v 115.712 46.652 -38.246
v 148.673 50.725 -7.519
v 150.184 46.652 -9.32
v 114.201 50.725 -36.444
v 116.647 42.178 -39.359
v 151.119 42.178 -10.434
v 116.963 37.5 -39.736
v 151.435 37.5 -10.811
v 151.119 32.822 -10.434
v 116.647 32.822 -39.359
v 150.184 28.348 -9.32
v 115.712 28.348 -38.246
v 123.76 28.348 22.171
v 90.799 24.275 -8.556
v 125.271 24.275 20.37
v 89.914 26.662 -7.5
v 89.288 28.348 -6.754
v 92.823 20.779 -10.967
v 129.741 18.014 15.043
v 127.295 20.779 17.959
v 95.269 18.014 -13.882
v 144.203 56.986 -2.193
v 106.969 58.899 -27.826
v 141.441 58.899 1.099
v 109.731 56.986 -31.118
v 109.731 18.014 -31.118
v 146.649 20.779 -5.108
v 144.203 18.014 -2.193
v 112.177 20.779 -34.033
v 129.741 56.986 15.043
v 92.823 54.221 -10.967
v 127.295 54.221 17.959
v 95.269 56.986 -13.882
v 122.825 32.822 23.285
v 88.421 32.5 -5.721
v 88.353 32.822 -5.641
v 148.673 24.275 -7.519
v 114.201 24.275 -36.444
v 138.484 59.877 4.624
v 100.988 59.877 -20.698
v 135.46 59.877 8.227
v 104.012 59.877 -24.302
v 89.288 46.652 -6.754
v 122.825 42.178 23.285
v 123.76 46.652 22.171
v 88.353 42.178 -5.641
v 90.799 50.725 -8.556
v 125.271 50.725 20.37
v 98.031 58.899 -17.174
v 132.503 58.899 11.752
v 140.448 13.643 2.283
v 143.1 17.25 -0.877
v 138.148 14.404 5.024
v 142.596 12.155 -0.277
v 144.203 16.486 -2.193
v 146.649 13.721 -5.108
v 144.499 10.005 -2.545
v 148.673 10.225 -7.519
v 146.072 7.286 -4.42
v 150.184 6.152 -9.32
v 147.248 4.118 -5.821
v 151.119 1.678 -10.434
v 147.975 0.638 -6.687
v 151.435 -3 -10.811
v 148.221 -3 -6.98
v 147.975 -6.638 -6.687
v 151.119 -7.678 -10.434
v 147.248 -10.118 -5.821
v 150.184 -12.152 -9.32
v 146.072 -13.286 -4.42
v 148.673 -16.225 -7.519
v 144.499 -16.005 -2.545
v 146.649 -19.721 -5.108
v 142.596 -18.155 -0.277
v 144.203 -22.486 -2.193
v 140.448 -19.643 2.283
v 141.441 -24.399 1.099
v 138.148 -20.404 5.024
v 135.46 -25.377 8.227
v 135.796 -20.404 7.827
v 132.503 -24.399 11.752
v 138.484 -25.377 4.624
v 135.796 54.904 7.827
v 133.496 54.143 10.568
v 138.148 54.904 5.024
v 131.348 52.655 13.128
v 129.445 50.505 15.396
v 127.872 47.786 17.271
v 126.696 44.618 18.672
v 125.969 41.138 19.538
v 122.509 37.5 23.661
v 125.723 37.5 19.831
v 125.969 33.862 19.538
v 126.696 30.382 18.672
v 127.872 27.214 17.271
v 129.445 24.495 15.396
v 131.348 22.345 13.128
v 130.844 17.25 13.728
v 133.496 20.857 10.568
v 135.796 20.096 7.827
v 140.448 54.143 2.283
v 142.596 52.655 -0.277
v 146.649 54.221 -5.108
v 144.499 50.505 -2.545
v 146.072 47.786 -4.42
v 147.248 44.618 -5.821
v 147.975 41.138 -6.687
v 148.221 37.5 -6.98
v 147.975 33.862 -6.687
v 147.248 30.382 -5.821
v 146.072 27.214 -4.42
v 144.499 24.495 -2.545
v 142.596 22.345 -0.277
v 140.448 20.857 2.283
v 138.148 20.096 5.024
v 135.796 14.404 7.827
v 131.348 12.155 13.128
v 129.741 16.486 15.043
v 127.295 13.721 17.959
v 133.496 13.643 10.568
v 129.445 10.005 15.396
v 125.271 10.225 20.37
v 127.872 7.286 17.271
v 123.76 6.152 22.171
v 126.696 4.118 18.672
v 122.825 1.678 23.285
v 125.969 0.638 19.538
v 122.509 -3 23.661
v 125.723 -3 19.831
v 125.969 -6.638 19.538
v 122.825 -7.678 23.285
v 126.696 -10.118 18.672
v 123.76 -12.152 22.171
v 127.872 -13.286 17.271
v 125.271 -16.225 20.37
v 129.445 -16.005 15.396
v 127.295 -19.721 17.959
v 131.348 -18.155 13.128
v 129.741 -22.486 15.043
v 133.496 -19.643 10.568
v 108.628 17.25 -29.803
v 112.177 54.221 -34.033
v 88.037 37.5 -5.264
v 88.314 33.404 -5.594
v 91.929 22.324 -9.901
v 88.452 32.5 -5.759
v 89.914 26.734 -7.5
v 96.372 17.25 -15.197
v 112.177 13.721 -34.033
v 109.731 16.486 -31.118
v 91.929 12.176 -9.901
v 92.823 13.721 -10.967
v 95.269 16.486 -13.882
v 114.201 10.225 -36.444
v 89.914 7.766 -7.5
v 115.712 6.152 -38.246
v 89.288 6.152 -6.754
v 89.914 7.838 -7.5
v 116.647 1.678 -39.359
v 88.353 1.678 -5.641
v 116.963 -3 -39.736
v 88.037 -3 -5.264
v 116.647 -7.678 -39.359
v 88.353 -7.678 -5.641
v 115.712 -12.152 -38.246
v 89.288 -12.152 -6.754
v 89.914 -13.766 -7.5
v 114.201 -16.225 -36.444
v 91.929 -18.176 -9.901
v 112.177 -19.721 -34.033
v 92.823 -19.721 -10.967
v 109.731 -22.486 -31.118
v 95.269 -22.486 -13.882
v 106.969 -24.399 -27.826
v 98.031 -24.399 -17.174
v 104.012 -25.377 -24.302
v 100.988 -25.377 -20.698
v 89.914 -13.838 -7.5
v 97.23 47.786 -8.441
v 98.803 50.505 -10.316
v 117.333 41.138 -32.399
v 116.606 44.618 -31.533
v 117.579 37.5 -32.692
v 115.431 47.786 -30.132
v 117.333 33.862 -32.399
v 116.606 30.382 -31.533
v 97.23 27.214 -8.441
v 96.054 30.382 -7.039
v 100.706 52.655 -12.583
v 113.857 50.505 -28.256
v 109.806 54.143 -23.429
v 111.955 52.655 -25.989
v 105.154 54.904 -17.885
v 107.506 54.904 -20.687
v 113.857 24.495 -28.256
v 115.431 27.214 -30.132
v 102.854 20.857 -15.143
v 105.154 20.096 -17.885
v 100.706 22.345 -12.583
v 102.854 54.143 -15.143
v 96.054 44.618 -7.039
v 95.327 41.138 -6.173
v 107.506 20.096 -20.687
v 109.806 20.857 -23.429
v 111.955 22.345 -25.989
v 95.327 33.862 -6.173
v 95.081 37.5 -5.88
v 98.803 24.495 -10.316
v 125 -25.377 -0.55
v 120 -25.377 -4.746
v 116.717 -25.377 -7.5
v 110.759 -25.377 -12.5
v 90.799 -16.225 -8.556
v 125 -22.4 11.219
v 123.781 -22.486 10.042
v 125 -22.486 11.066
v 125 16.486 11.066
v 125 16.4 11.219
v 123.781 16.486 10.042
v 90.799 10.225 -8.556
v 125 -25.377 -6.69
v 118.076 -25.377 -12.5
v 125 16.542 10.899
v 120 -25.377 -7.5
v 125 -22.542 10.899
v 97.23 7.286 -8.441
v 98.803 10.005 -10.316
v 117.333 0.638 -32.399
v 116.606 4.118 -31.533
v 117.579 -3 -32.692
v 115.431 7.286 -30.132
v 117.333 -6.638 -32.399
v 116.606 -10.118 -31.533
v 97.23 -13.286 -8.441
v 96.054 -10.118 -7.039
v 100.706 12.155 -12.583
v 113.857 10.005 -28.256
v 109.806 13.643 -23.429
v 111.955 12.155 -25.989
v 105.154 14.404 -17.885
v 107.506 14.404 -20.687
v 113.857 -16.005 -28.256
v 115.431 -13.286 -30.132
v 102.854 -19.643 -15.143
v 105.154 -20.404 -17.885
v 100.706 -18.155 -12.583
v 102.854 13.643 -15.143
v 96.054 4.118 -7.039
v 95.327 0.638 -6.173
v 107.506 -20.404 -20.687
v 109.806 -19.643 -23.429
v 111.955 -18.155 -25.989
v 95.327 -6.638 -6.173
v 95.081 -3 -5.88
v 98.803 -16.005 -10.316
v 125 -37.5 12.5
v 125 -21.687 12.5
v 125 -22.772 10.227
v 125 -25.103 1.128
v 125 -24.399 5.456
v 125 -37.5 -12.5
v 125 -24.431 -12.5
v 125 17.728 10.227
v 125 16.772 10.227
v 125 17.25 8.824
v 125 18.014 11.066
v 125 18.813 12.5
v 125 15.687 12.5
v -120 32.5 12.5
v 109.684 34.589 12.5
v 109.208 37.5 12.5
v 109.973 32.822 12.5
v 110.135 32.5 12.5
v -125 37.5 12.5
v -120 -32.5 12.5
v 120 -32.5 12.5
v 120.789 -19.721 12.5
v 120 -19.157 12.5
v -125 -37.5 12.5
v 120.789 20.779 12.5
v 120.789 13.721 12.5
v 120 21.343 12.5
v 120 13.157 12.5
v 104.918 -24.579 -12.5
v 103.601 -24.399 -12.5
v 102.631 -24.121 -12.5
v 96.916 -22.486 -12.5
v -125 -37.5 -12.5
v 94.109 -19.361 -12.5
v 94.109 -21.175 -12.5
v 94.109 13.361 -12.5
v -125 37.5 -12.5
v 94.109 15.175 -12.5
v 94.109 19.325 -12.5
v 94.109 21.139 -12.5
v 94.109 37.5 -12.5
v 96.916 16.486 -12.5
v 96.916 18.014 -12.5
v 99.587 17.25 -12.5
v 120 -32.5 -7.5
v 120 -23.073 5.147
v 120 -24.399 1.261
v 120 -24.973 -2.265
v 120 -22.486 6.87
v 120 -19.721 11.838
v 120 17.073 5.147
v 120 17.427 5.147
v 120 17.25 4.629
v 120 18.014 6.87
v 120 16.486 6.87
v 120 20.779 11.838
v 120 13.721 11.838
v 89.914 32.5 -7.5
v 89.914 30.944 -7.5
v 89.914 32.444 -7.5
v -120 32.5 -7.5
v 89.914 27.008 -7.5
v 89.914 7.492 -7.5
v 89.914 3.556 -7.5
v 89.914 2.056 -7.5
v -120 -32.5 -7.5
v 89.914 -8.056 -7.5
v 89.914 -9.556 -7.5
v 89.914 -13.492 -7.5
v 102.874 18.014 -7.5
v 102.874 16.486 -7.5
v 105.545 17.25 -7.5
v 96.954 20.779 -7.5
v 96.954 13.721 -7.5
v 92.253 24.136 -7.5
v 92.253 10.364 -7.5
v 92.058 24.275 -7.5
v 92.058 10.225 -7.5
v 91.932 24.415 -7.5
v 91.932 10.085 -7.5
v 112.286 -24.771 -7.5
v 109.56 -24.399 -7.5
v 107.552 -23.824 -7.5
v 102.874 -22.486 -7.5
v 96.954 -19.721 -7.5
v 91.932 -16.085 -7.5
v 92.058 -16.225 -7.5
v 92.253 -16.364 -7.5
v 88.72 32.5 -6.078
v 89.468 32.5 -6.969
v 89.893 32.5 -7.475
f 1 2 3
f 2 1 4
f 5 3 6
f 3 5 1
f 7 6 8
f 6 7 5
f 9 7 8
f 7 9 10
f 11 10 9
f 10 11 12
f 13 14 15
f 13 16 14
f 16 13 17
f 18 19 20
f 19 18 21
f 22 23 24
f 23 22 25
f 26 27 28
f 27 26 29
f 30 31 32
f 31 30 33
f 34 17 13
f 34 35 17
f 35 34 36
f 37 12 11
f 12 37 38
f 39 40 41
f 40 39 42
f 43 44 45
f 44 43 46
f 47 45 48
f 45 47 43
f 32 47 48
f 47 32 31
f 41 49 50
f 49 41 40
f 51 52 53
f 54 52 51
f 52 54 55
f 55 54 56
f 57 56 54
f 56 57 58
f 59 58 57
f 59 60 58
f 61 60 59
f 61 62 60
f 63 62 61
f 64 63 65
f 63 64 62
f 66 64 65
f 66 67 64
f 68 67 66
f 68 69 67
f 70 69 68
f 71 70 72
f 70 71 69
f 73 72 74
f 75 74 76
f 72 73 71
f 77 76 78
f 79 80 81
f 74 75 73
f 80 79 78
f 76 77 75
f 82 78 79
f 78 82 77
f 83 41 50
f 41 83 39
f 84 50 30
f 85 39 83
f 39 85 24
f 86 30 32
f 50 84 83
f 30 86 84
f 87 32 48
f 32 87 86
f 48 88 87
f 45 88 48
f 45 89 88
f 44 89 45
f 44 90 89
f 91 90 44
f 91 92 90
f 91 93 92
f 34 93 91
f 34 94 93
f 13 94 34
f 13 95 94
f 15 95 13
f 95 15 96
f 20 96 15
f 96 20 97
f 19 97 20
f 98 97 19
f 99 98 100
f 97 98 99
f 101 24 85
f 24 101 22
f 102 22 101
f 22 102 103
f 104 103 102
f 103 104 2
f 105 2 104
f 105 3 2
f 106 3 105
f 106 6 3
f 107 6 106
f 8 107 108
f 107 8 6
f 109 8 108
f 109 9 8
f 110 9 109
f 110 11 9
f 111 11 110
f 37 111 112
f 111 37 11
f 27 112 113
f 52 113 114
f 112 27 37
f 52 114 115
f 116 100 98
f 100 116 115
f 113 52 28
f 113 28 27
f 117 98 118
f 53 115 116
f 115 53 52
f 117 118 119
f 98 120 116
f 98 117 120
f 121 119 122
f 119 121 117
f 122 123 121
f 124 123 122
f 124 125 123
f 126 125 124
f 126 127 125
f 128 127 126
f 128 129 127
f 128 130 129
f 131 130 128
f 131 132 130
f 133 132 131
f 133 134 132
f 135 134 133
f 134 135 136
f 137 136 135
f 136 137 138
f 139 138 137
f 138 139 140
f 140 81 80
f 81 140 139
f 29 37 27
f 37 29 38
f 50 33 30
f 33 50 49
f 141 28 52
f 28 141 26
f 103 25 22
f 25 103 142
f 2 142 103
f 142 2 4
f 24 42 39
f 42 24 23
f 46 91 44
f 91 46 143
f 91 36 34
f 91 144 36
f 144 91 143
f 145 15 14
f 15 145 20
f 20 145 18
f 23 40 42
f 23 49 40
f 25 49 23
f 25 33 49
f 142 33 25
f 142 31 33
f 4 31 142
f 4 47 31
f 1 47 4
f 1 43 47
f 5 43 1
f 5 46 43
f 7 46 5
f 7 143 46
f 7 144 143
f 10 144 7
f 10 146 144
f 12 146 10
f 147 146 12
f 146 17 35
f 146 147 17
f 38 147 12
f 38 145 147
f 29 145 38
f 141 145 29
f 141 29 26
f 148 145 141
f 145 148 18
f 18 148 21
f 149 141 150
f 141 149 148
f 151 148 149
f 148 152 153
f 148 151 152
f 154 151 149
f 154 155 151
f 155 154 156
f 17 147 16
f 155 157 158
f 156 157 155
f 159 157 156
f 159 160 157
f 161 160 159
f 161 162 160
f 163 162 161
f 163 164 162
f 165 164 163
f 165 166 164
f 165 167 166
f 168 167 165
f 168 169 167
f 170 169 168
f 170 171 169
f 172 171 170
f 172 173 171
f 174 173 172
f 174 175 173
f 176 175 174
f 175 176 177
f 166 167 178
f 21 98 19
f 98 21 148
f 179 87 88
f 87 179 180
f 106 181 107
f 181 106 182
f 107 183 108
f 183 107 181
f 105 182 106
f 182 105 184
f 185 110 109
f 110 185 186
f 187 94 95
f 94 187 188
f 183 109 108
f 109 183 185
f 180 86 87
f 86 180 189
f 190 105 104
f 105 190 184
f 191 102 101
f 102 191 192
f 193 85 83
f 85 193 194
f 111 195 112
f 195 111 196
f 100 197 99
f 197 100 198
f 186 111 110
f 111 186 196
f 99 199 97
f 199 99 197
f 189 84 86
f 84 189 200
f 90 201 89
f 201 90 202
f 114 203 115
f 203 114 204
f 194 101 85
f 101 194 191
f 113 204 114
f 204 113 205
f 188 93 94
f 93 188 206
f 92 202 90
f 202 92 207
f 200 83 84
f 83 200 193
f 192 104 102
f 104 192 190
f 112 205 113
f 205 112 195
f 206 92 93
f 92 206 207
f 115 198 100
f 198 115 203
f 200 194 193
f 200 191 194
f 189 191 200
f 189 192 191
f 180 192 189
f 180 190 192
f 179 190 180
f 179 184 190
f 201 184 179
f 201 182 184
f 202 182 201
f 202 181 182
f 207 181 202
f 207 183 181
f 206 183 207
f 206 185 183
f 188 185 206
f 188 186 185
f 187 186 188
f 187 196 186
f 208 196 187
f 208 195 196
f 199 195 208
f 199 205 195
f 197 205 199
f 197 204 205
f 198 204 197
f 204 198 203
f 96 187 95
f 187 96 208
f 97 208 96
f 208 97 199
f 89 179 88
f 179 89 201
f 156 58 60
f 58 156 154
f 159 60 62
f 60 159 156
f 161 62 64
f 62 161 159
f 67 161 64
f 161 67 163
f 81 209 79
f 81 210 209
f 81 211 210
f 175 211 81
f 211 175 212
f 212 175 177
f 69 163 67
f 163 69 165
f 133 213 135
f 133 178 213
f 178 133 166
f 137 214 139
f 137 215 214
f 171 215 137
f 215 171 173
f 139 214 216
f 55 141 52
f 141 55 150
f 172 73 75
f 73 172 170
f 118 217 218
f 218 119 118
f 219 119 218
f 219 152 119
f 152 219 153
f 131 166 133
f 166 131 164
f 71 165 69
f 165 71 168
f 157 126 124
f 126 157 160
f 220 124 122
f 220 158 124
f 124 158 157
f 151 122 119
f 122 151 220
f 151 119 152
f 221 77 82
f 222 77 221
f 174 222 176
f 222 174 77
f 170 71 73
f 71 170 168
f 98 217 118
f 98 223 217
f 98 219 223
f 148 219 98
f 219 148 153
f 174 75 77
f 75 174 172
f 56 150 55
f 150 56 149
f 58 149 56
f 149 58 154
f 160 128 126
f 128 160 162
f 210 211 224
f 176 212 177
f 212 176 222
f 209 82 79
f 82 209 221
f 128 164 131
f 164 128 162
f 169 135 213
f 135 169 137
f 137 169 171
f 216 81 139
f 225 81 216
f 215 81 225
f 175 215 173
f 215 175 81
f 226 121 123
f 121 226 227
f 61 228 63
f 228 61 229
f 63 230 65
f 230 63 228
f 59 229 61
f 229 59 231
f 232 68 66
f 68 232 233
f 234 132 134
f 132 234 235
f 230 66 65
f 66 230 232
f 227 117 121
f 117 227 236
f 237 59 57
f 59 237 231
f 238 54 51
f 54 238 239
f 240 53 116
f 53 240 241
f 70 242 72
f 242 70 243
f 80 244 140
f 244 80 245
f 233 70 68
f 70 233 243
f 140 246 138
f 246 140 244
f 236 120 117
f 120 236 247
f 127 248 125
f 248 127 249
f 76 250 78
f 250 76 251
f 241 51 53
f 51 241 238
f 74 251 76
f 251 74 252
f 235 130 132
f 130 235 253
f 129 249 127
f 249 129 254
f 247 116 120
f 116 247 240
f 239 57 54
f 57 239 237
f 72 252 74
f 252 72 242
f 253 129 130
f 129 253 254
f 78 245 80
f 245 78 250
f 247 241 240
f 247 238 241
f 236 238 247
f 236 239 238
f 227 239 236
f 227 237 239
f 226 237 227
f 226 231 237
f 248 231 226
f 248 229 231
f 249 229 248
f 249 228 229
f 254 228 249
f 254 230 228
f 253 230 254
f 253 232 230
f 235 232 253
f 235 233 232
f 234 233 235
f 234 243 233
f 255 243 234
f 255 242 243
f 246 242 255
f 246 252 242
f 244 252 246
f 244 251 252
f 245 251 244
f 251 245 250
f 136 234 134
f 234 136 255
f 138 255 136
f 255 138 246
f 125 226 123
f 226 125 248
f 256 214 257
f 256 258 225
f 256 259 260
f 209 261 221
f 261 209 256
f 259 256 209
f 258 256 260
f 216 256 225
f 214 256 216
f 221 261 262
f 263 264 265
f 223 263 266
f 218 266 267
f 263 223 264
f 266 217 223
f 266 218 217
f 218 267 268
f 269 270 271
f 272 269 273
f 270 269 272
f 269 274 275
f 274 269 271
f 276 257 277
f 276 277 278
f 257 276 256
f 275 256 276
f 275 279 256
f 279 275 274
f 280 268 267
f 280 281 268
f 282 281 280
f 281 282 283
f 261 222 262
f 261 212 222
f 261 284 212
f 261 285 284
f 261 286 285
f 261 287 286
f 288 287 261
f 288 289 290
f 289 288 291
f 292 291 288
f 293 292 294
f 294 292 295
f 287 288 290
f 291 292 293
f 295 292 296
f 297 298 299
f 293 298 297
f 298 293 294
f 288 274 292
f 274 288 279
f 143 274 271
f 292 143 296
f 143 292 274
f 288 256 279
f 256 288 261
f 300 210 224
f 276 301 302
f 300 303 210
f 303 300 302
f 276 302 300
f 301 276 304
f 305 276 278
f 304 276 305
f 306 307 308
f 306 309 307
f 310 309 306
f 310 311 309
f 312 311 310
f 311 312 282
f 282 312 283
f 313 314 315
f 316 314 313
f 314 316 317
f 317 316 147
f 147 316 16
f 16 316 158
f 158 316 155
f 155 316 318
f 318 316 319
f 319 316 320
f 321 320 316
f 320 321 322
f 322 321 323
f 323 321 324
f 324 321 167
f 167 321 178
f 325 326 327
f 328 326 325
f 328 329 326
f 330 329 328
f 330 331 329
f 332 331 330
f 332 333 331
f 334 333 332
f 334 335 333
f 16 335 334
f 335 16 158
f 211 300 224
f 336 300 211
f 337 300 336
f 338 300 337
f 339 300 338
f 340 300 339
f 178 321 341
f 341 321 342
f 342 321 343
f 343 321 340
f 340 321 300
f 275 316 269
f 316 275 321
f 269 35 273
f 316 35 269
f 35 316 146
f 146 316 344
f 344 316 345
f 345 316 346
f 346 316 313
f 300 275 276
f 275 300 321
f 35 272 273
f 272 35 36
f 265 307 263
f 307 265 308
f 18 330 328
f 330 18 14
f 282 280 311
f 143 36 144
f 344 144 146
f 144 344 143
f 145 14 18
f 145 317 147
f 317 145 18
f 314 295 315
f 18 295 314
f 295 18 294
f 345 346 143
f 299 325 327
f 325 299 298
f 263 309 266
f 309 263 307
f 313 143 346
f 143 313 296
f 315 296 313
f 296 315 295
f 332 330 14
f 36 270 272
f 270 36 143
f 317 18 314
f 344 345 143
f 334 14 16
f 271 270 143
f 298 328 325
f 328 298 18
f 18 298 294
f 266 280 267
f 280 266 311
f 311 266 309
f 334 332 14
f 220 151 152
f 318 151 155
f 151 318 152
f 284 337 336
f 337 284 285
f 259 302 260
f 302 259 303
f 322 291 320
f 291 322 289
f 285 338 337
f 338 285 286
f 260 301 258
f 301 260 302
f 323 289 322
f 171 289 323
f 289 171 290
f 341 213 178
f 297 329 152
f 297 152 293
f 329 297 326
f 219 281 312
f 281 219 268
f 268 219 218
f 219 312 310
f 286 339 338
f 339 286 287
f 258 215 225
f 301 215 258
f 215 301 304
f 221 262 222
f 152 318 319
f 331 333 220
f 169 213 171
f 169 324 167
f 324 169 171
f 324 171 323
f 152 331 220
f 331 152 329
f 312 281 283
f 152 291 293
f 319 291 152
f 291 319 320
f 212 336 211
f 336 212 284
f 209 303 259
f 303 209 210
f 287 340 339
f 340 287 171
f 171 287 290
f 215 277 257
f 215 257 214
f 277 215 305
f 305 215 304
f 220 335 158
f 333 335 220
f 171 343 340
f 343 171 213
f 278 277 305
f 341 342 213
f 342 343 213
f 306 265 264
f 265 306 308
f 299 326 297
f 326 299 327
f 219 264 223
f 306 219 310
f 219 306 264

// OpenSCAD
shelf_w = 250;
shelf_d = 75; //depth
shelf_h = 25;
wall_w = 5;


// toothbrush holder
toothb_d = 35;
toothb_h = 45;

module toothbrush_holder_vol(d,h) {
  rotate([0,50,0])
  cylinder(d=d+wall_w * 2, h=h);
};

module toothbrush_holder(d,h) {
  rotate([0,50,0])
    difference() {
      cylinder(d=d+wall_w * 2, h=h);
      translate([0,0,wall_w]) cylinder(d=d, h=h);
    }
};

translate([shelf_w/2 - toothb_d / 2  -wall_w, shelf_d / 2, -toothb_h/2])
  toothbrush_holder(toothb_d, toothb_h);
translate([shelf_w/2 - toothb_d / 2  -wall_w, -3 , -toothb_h/2])
  toothbrush_holder(toothb_d, toothb_h);

//shelf
difference() {
  cube([shelf_w, shelf_d, shelf_h], center=true);
  translate([0,0,wall_w]) cube([shelf_w - wall_w * 2, shelf_d - wall_w * 2, shelf_h], center=true);
  translate([shelf_w/2 - toothb_d / 2  -wall_w, shelf_d / 2, -toothb_h/2])
    toothbrush_holder_vol(toothb_d, toothb_h);
  translate([shelf_w/2 - toothb_d / 2  -wall_w, -3, -toothb_h/2])
    toothbrush_holder_vol(toothb_d, toothb_h);
};
